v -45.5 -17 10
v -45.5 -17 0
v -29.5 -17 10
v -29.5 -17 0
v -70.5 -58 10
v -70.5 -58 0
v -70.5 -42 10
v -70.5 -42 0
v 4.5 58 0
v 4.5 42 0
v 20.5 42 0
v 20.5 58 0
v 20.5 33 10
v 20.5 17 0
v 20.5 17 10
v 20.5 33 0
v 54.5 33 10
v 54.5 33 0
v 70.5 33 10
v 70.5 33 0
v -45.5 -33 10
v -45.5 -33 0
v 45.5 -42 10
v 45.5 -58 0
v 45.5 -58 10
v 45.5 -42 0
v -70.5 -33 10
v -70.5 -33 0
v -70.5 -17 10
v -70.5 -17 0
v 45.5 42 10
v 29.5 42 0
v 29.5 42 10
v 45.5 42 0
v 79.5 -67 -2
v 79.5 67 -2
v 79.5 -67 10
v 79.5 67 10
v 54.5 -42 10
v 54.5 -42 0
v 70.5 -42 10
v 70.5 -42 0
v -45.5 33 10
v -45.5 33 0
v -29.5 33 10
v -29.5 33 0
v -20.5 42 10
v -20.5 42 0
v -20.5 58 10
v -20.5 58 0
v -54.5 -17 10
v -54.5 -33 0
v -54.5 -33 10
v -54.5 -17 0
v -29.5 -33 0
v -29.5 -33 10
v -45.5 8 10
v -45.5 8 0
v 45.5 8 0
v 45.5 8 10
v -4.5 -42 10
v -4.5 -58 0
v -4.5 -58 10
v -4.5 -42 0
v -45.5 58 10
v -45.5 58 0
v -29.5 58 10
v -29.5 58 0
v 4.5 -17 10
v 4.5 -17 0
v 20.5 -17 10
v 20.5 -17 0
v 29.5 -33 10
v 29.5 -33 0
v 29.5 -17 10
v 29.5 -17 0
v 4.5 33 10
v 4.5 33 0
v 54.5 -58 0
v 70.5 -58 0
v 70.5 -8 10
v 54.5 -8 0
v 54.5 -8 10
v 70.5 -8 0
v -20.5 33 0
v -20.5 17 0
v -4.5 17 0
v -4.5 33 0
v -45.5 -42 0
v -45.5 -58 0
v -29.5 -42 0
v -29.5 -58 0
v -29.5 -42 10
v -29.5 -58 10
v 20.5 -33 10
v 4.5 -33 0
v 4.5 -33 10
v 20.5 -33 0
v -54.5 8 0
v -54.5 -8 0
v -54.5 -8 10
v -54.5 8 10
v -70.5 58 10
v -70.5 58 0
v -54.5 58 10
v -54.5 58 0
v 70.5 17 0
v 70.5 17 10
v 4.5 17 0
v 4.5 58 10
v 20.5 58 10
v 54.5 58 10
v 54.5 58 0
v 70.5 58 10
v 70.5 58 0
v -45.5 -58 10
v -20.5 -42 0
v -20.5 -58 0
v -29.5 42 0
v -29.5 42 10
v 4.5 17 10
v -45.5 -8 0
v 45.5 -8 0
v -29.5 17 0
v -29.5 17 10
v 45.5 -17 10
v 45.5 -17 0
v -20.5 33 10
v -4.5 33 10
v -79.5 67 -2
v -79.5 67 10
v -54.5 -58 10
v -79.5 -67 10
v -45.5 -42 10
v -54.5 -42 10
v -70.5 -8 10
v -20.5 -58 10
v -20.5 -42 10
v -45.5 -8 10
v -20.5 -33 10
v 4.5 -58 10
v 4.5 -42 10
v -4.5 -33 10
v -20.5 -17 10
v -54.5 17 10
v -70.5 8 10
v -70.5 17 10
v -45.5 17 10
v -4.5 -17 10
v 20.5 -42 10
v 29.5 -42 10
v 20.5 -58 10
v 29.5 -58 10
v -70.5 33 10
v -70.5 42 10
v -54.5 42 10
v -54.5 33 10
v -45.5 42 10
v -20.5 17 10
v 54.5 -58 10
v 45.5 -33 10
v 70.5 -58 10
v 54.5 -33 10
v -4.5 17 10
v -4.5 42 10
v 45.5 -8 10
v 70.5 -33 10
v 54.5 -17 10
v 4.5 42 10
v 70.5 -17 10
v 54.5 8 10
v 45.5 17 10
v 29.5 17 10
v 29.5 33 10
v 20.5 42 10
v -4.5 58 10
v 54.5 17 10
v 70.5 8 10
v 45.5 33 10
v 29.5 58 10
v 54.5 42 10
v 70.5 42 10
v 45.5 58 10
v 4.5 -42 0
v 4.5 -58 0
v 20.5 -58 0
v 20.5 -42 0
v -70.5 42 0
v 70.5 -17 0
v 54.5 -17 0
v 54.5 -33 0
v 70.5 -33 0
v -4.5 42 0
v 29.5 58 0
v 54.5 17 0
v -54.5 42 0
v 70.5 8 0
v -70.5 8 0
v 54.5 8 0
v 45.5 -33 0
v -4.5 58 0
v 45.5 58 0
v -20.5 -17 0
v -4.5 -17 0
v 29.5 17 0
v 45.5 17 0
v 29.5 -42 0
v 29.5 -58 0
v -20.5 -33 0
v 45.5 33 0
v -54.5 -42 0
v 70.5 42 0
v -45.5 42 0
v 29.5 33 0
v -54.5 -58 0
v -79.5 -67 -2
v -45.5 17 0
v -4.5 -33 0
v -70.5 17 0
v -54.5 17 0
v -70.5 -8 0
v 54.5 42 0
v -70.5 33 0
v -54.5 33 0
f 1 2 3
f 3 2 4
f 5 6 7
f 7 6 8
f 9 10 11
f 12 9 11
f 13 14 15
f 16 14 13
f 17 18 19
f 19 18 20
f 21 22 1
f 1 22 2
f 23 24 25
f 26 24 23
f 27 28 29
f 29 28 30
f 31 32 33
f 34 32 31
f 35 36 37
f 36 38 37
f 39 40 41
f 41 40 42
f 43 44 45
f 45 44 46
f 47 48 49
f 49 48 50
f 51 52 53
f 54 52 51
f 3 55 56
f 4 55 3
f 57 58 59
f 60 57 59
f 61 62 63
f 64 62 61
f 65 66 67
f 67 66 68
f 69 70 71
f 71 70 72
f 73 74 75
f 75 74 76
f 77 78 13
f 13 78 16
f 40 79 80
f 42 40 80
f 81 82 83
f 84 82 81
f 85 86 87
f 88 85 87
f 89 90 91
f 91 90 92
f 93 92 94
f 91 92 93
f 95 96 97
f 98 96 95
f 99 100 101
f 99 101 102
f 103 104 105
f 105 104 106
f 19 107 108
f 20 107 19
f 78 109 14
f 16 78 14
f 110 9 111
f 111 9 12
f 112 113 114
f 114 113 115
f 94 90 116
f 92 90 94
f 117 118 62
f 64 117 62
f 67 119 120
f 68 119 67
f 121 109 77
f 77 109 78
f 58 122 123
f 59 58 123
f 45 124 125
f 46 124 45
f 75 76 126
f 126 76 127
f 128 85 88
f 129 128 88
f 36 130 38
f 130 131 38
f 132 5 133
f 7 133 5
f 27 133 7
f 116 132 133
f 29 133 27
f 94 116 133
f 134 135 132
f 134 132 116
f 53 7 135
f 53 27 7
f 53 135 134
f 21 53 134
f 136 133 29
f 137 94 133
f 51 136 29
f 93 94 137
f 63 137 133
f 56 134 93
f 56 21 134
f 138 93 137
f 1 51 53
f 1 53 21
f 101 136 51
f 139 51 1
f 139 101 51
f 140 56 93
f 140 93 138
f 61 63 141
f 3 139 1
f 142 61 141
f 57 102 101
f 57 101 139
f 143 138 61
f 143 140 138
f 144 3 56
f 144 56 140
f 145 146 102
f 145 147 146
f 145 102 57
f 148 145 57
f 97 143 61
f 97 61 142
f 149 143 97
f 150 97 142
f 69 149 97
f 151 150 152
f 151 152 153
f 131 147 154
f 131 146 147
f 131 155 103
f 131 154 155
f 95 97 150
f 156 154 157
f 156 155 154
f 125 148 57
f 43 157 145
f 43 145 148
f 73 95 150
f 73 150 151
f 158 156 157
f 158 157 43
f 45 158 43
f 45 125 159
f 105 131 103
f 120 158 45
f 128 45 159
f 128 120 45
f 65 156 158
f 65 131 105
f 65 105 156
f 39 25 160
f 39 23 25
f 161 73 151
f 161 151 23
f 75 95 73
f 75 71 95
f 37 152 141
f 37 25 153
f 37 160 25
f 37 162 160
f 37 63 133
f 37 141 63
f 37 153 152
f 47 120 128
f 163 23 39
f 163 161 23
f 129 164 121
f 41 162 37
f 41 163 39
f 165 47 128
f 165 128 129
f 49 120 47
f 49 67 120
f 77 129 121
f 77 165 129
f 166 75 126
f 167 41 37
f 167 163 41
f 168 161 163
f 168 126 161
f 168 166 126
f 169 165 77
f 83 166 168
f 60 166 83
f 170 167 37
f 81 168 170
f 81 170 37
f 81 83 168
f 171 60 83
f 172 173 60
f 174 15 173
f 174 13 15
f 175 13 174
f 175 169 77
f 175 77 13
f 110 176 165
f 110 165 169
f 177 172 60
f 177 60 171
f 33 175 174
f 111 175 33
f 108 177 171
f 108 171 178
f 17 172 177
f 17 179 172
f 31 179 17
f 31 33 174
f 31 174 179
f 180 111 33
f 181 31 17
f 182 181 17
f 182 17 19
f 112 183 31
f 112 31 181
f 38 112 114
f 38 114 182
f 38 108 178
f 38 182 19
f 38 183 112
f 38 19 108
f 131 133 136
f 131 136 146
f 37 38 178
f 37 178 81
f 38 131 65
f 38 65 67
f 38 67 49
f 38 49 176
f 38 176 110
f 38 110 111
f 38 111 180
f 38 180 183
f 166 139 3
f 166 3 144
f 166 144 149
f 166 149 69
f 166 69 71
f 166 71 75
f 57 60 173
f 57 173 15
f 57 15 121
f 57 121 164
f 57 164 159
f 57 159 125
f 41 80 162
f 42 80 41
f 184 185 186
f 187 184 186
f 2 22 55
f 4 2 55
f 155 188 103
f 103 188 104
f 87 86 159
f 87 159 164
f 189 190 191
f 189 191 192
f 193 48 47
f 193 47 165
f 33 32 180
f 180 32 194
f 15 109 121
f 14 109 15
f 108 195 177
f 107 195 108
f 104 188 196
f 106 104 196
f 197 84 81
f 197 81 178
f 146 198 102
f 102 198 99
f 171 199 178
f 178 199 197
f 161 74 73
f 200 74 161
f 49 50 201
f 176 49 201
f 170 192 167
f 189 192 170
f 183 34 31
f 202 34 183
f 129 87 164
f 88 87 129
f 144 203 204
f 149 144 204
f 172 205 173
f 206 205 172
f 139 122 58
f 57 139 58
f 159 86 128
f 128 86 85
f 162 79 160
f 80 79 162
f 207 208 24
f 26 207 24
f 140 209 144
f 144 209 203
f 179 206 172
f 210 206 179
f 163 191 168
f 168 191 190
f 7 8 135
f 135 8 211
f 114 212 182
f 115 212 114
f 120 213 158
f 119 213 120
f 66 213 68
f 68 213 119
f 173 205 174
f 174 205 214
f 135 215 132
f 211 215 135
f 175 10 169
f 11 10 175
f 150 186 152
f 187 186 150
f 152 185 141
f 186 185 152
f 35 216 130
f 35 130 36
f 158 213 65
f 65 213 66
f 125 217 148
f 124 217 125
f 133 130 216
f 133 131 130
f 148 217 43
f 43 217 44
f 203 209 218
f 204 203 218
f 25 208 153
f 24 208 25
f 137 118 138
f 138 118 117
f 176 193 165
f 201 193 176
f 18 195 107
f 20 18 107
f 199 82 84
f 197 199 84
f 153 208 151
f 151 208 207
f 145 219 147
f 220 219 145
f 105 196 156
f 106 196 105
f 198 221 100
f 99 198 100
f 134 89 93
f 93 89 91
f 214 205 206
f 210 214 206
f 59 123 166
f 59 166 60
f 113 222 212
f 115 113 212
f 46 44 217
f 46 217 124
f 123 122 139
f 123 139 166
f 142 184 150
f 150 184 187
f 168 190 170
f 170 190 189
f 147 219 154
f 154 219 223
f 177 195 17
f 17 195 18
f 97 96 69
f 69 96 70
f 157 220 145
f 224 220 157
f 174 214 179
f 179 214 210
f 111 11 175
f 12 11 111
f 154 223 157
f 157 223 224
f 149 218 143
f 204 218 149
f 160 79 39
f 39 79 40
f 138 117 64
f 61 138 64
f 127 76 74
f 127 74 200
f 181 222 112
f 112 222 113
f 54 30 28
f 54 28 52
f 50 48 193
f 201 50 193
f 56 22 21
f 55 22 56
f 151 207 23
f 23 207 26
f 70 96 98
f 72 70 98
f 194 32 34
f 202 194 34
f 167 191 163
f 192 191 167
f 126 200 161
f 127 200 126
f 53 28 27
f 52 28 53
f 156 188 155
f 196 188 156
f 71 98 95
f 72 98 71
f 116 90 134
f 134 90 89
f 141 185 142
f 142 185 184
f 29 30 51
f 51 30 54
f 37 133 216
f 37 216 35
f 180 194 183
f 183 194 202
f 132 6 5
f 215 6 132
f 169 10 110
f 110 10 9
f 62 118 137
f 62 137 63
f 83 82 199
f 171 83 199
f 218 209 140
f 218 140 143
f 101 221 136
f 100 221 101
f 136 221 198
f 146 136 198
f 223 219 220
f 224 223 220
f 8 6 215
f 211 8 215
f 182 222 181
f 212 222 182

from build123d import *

# Parameters (mm, degrees)
F0_W     = 159
F0_H     = 134
F0_W_2   = 16
F0_H_2   = 16
F0_W_3   = 91
F1_DEPTH = 10
F2_W     = 159
F2_H     = 134
F3_DEPTH = 2


with BuildPart() as f1:
    # F0 (on Top) → F1 (new body)
    with BuildSketch(Plane.XY):
        Rectangle(F0_W, F0_H)
        with Locations((-62.5, -50)):
            Rectangle(F0_W_2, F0_H_2, mode=Mode.SUBTRACT)
        with Locations((-37.5, -50)):
            Rectangle(F0_W_2, F0_H_2, mode=Mode.SUBTRACT)
        with Locations((-12.5, -50)):
            Rectangle(F0_W_2, F0_H_2, mode=Mode.SUBTRACT)
        with Locations((-62.5, -25)):
            Rectangle(F0_W_2, F0_H_2, mode=Mode.SUBTRACT)
        with Locations((-37.5, -25)):
            Rectangle(F0_W_2, F0_H_2, mode=Mode.SUBTRACT)
        with Locations((-12.5, -25)):
            Rectangle(F0_W_2, F0_H_2, mode=Mode.SUBTRACT)
        with Locations((12.5, -50)):
            Rectangle(F0_W_2, F0_H_2, mode=Mode.SUBTRACT)
        with Locations((37.5, -50)):
            Rectangle(F0_W_2, F0_H_2, mode=Mode.SUBTRACT)
        with Locations((62.5, -50)):
            Rectangle(F0_W_2, F0_H_2, mode=Mode.SUBTRACT)
        with Locations((12.5, -25)):
            Rectangle(F0_W_2, F0_H_2, mode=Mode.SUBTRACT)
        with Locations((37.5, -25)):
            Rectangle(F0_W_2, F0_H_2, mode=Mode.SUBTRACT)
        with Locations((62.5, -25)):
            Rectangle(F0_W_2, F0_H_2, mode=Mode.SUBTRACT)
        with Locations((-62.5, 0)):
            Rectangle(F0_W_2, F0_H_2, mode=Mode.SUBTRACT)
        with Locations((-62.5, 25)):
            Rectangle(F0_W_2, F0_H_2, mode=Mode.SUBTRACT)
        with Locations((-37.5, 25)):
            Rectangle(F0_W_2, F0_H_2, mode=Mode.SUBTRACT)
        with Locations((-12.5, 25)):
            Rectangle(F0_W_2, F0_H_2, mode=Mode.SUBTRACT)
        with Locations((-62.5, 50)):
            Rectangle(F0_W_2, F0_H_2, mode=Mode.SUBTRACT)
        with Locations((-37.5, 50)):
            Rectangle(F0_W_2, F0_H_2, mode=Mode.SUBTRACT)
        with Locations((-12.5, 50)):
            Rectangle(F0_W_2, F0_H_2, mode=Mode.SUBTRACT)
        Rectangle(F0_W_3, F0_H_2, mode=Mode.SUBTRACT)
        with Locations((12.5, 25)):
            Rectangle(F0_W_2, F0_H_2, mode=Mode.SUBTRACT)
        with Locations((37.5, 25)):
            Rectangle(F0_W_2, F0_H_2, mode=Mode.SUBTRACT)
        with Locations((62.5, 0)):
            Rectangle(F0_W_2, F0_H_2, mode=Mode.SUBTRACT)
        with Locations((62.5, 25)):
            Rectangle(F0_W_2, F0_H_2, mode=Mode.SUBTRACT)
        with Locations((12.5, 50)):
            Rectangle(F0_W_2, F0_H_2, mode=Mode.SUBTRACT)
        with Locations((37.5, 50)):
            Rectangle(F0_W_2, F0_H_2, mode=Mode.SUBTRACT)
        with Locations((62.5, 50)):
            Rectangle(F0_W_2, F0_H_2, mode=Mode.SUBTRACT)
    extrude(amount=F1_DEPTH)

    # F2 (on face) → F3 (join)
    with BuildSketch(Plane(origin=(0, 0, 0), x_dir=(1, 0, 0), z_dir=(0, 0, -1))):
        Rectangle(F2_W, F2_H)
    extrude(amount=F3_DEPTH)


solid = f1.part
